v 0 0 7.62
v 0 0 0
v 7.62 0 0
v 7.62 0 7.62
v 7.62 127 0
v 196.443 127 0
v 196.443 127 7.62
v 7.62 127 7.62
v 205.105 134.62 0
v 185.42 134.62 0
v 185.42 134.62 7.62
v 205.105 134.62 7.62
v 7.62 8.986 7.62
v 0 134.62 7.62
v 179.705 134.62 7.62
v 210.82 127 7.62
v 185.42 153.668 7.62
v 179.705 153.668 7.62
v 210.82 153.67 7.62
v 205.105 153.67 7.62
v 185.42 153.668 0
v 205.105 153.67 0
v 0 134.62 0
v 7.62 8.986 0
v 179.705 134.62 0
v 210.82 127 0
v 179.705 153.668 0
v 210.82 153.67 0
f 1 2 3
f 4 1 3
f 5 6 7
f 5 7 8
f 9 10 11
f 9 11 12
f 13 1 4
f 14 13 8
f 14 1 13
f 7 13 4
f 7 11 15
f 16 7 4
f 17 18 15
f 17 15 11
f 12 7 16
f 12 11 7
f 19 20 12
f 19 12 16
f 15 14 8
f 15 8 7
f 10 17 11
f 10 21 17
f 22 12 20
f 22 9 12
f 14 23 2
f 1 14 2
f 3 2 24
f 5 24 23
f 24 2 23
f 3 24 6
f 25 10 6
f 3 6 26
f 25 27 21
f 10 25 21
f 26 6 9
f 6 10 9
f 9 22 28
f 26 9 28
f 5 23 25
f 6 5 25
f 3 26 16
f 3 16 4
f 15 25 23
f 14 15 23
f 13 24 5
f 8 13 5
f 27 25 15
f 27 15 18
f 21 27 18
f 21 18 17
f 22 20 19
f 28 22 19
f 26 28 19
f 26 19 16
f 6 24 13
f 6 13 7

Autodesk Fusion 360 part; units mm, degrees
sketch "Sketch1" plane through (0, 0, 0) normal (0, 0, 1) x (1, 0, 0)
  line L0 (0, 0) -> (7.62, 0)
  line L1 (7.62, 0) -> (7.62, 134.62)
  line L2 (7.62, 134.62) -> (0, 134.62)
  line L3 (0, 134.62) -> (0, 0)
  line L4 (7.62, 134.62) -> (210.82, 134.62)
  line L5 (210.82, 134.62) -> (210.82, 127)
  line L6 (210.82, 127) -> (7.62, 127)
  line L7 (7.62, 127) -> (7.62, 134.62)
  line L8 (210.82, 127) -> (7.62, 0)
  line L9 (7.62, 0) -> (3.5814, 6.4617)
  line L10 (3.5814, 6.4617) -> (206.7814, 133.4617)
  line L11 (206.7814, 133.4617) -> (210.82, 127)
  line L12 (210.82, 134.62) -> (205.105, 134.62)
  line L13 (205.105, 134.62) -> (205.105, 153.67)
  line L14 (205.105, 153.67) -> (210.82, 153.67)
  line L15 (210.82, 153.67) -> (210.82, 134.62)
  line L16 (185.42, 134.62) -> (179.705, 134.62)
  line L17 (179.705, 134.62) -> (179.705, 153.6683)
  line L18 (179.705, 153.6683) -> (185.42, 153.6683)
  line L19 (185.42, 153.6683) -> (185.42, 134.62)
  dimension "d1" = 134.62
  dimension "d2" = 7.62
  dimension "d3" = 203.2
  dimension "d4" = 7.62
  dimension "d5" = 5.715
  dimension "d6" = 19.05
  dimension "d7" = 19.0483
  dimension "d8" = 5.715
extrude "Extrude1" add sketch "Sketch1" along normal blind 7.62 contours L0 L1 L2 L3 L7 L9 L10 | L1 L9 L10 | L1 L6 L8 L10 | L1 L4 L5 L6 L7 L10 L11 L12 L16 | L6 L10 L11 | L4 L12 L13 L14 L15 | L4 L16 L17 L18 L19
